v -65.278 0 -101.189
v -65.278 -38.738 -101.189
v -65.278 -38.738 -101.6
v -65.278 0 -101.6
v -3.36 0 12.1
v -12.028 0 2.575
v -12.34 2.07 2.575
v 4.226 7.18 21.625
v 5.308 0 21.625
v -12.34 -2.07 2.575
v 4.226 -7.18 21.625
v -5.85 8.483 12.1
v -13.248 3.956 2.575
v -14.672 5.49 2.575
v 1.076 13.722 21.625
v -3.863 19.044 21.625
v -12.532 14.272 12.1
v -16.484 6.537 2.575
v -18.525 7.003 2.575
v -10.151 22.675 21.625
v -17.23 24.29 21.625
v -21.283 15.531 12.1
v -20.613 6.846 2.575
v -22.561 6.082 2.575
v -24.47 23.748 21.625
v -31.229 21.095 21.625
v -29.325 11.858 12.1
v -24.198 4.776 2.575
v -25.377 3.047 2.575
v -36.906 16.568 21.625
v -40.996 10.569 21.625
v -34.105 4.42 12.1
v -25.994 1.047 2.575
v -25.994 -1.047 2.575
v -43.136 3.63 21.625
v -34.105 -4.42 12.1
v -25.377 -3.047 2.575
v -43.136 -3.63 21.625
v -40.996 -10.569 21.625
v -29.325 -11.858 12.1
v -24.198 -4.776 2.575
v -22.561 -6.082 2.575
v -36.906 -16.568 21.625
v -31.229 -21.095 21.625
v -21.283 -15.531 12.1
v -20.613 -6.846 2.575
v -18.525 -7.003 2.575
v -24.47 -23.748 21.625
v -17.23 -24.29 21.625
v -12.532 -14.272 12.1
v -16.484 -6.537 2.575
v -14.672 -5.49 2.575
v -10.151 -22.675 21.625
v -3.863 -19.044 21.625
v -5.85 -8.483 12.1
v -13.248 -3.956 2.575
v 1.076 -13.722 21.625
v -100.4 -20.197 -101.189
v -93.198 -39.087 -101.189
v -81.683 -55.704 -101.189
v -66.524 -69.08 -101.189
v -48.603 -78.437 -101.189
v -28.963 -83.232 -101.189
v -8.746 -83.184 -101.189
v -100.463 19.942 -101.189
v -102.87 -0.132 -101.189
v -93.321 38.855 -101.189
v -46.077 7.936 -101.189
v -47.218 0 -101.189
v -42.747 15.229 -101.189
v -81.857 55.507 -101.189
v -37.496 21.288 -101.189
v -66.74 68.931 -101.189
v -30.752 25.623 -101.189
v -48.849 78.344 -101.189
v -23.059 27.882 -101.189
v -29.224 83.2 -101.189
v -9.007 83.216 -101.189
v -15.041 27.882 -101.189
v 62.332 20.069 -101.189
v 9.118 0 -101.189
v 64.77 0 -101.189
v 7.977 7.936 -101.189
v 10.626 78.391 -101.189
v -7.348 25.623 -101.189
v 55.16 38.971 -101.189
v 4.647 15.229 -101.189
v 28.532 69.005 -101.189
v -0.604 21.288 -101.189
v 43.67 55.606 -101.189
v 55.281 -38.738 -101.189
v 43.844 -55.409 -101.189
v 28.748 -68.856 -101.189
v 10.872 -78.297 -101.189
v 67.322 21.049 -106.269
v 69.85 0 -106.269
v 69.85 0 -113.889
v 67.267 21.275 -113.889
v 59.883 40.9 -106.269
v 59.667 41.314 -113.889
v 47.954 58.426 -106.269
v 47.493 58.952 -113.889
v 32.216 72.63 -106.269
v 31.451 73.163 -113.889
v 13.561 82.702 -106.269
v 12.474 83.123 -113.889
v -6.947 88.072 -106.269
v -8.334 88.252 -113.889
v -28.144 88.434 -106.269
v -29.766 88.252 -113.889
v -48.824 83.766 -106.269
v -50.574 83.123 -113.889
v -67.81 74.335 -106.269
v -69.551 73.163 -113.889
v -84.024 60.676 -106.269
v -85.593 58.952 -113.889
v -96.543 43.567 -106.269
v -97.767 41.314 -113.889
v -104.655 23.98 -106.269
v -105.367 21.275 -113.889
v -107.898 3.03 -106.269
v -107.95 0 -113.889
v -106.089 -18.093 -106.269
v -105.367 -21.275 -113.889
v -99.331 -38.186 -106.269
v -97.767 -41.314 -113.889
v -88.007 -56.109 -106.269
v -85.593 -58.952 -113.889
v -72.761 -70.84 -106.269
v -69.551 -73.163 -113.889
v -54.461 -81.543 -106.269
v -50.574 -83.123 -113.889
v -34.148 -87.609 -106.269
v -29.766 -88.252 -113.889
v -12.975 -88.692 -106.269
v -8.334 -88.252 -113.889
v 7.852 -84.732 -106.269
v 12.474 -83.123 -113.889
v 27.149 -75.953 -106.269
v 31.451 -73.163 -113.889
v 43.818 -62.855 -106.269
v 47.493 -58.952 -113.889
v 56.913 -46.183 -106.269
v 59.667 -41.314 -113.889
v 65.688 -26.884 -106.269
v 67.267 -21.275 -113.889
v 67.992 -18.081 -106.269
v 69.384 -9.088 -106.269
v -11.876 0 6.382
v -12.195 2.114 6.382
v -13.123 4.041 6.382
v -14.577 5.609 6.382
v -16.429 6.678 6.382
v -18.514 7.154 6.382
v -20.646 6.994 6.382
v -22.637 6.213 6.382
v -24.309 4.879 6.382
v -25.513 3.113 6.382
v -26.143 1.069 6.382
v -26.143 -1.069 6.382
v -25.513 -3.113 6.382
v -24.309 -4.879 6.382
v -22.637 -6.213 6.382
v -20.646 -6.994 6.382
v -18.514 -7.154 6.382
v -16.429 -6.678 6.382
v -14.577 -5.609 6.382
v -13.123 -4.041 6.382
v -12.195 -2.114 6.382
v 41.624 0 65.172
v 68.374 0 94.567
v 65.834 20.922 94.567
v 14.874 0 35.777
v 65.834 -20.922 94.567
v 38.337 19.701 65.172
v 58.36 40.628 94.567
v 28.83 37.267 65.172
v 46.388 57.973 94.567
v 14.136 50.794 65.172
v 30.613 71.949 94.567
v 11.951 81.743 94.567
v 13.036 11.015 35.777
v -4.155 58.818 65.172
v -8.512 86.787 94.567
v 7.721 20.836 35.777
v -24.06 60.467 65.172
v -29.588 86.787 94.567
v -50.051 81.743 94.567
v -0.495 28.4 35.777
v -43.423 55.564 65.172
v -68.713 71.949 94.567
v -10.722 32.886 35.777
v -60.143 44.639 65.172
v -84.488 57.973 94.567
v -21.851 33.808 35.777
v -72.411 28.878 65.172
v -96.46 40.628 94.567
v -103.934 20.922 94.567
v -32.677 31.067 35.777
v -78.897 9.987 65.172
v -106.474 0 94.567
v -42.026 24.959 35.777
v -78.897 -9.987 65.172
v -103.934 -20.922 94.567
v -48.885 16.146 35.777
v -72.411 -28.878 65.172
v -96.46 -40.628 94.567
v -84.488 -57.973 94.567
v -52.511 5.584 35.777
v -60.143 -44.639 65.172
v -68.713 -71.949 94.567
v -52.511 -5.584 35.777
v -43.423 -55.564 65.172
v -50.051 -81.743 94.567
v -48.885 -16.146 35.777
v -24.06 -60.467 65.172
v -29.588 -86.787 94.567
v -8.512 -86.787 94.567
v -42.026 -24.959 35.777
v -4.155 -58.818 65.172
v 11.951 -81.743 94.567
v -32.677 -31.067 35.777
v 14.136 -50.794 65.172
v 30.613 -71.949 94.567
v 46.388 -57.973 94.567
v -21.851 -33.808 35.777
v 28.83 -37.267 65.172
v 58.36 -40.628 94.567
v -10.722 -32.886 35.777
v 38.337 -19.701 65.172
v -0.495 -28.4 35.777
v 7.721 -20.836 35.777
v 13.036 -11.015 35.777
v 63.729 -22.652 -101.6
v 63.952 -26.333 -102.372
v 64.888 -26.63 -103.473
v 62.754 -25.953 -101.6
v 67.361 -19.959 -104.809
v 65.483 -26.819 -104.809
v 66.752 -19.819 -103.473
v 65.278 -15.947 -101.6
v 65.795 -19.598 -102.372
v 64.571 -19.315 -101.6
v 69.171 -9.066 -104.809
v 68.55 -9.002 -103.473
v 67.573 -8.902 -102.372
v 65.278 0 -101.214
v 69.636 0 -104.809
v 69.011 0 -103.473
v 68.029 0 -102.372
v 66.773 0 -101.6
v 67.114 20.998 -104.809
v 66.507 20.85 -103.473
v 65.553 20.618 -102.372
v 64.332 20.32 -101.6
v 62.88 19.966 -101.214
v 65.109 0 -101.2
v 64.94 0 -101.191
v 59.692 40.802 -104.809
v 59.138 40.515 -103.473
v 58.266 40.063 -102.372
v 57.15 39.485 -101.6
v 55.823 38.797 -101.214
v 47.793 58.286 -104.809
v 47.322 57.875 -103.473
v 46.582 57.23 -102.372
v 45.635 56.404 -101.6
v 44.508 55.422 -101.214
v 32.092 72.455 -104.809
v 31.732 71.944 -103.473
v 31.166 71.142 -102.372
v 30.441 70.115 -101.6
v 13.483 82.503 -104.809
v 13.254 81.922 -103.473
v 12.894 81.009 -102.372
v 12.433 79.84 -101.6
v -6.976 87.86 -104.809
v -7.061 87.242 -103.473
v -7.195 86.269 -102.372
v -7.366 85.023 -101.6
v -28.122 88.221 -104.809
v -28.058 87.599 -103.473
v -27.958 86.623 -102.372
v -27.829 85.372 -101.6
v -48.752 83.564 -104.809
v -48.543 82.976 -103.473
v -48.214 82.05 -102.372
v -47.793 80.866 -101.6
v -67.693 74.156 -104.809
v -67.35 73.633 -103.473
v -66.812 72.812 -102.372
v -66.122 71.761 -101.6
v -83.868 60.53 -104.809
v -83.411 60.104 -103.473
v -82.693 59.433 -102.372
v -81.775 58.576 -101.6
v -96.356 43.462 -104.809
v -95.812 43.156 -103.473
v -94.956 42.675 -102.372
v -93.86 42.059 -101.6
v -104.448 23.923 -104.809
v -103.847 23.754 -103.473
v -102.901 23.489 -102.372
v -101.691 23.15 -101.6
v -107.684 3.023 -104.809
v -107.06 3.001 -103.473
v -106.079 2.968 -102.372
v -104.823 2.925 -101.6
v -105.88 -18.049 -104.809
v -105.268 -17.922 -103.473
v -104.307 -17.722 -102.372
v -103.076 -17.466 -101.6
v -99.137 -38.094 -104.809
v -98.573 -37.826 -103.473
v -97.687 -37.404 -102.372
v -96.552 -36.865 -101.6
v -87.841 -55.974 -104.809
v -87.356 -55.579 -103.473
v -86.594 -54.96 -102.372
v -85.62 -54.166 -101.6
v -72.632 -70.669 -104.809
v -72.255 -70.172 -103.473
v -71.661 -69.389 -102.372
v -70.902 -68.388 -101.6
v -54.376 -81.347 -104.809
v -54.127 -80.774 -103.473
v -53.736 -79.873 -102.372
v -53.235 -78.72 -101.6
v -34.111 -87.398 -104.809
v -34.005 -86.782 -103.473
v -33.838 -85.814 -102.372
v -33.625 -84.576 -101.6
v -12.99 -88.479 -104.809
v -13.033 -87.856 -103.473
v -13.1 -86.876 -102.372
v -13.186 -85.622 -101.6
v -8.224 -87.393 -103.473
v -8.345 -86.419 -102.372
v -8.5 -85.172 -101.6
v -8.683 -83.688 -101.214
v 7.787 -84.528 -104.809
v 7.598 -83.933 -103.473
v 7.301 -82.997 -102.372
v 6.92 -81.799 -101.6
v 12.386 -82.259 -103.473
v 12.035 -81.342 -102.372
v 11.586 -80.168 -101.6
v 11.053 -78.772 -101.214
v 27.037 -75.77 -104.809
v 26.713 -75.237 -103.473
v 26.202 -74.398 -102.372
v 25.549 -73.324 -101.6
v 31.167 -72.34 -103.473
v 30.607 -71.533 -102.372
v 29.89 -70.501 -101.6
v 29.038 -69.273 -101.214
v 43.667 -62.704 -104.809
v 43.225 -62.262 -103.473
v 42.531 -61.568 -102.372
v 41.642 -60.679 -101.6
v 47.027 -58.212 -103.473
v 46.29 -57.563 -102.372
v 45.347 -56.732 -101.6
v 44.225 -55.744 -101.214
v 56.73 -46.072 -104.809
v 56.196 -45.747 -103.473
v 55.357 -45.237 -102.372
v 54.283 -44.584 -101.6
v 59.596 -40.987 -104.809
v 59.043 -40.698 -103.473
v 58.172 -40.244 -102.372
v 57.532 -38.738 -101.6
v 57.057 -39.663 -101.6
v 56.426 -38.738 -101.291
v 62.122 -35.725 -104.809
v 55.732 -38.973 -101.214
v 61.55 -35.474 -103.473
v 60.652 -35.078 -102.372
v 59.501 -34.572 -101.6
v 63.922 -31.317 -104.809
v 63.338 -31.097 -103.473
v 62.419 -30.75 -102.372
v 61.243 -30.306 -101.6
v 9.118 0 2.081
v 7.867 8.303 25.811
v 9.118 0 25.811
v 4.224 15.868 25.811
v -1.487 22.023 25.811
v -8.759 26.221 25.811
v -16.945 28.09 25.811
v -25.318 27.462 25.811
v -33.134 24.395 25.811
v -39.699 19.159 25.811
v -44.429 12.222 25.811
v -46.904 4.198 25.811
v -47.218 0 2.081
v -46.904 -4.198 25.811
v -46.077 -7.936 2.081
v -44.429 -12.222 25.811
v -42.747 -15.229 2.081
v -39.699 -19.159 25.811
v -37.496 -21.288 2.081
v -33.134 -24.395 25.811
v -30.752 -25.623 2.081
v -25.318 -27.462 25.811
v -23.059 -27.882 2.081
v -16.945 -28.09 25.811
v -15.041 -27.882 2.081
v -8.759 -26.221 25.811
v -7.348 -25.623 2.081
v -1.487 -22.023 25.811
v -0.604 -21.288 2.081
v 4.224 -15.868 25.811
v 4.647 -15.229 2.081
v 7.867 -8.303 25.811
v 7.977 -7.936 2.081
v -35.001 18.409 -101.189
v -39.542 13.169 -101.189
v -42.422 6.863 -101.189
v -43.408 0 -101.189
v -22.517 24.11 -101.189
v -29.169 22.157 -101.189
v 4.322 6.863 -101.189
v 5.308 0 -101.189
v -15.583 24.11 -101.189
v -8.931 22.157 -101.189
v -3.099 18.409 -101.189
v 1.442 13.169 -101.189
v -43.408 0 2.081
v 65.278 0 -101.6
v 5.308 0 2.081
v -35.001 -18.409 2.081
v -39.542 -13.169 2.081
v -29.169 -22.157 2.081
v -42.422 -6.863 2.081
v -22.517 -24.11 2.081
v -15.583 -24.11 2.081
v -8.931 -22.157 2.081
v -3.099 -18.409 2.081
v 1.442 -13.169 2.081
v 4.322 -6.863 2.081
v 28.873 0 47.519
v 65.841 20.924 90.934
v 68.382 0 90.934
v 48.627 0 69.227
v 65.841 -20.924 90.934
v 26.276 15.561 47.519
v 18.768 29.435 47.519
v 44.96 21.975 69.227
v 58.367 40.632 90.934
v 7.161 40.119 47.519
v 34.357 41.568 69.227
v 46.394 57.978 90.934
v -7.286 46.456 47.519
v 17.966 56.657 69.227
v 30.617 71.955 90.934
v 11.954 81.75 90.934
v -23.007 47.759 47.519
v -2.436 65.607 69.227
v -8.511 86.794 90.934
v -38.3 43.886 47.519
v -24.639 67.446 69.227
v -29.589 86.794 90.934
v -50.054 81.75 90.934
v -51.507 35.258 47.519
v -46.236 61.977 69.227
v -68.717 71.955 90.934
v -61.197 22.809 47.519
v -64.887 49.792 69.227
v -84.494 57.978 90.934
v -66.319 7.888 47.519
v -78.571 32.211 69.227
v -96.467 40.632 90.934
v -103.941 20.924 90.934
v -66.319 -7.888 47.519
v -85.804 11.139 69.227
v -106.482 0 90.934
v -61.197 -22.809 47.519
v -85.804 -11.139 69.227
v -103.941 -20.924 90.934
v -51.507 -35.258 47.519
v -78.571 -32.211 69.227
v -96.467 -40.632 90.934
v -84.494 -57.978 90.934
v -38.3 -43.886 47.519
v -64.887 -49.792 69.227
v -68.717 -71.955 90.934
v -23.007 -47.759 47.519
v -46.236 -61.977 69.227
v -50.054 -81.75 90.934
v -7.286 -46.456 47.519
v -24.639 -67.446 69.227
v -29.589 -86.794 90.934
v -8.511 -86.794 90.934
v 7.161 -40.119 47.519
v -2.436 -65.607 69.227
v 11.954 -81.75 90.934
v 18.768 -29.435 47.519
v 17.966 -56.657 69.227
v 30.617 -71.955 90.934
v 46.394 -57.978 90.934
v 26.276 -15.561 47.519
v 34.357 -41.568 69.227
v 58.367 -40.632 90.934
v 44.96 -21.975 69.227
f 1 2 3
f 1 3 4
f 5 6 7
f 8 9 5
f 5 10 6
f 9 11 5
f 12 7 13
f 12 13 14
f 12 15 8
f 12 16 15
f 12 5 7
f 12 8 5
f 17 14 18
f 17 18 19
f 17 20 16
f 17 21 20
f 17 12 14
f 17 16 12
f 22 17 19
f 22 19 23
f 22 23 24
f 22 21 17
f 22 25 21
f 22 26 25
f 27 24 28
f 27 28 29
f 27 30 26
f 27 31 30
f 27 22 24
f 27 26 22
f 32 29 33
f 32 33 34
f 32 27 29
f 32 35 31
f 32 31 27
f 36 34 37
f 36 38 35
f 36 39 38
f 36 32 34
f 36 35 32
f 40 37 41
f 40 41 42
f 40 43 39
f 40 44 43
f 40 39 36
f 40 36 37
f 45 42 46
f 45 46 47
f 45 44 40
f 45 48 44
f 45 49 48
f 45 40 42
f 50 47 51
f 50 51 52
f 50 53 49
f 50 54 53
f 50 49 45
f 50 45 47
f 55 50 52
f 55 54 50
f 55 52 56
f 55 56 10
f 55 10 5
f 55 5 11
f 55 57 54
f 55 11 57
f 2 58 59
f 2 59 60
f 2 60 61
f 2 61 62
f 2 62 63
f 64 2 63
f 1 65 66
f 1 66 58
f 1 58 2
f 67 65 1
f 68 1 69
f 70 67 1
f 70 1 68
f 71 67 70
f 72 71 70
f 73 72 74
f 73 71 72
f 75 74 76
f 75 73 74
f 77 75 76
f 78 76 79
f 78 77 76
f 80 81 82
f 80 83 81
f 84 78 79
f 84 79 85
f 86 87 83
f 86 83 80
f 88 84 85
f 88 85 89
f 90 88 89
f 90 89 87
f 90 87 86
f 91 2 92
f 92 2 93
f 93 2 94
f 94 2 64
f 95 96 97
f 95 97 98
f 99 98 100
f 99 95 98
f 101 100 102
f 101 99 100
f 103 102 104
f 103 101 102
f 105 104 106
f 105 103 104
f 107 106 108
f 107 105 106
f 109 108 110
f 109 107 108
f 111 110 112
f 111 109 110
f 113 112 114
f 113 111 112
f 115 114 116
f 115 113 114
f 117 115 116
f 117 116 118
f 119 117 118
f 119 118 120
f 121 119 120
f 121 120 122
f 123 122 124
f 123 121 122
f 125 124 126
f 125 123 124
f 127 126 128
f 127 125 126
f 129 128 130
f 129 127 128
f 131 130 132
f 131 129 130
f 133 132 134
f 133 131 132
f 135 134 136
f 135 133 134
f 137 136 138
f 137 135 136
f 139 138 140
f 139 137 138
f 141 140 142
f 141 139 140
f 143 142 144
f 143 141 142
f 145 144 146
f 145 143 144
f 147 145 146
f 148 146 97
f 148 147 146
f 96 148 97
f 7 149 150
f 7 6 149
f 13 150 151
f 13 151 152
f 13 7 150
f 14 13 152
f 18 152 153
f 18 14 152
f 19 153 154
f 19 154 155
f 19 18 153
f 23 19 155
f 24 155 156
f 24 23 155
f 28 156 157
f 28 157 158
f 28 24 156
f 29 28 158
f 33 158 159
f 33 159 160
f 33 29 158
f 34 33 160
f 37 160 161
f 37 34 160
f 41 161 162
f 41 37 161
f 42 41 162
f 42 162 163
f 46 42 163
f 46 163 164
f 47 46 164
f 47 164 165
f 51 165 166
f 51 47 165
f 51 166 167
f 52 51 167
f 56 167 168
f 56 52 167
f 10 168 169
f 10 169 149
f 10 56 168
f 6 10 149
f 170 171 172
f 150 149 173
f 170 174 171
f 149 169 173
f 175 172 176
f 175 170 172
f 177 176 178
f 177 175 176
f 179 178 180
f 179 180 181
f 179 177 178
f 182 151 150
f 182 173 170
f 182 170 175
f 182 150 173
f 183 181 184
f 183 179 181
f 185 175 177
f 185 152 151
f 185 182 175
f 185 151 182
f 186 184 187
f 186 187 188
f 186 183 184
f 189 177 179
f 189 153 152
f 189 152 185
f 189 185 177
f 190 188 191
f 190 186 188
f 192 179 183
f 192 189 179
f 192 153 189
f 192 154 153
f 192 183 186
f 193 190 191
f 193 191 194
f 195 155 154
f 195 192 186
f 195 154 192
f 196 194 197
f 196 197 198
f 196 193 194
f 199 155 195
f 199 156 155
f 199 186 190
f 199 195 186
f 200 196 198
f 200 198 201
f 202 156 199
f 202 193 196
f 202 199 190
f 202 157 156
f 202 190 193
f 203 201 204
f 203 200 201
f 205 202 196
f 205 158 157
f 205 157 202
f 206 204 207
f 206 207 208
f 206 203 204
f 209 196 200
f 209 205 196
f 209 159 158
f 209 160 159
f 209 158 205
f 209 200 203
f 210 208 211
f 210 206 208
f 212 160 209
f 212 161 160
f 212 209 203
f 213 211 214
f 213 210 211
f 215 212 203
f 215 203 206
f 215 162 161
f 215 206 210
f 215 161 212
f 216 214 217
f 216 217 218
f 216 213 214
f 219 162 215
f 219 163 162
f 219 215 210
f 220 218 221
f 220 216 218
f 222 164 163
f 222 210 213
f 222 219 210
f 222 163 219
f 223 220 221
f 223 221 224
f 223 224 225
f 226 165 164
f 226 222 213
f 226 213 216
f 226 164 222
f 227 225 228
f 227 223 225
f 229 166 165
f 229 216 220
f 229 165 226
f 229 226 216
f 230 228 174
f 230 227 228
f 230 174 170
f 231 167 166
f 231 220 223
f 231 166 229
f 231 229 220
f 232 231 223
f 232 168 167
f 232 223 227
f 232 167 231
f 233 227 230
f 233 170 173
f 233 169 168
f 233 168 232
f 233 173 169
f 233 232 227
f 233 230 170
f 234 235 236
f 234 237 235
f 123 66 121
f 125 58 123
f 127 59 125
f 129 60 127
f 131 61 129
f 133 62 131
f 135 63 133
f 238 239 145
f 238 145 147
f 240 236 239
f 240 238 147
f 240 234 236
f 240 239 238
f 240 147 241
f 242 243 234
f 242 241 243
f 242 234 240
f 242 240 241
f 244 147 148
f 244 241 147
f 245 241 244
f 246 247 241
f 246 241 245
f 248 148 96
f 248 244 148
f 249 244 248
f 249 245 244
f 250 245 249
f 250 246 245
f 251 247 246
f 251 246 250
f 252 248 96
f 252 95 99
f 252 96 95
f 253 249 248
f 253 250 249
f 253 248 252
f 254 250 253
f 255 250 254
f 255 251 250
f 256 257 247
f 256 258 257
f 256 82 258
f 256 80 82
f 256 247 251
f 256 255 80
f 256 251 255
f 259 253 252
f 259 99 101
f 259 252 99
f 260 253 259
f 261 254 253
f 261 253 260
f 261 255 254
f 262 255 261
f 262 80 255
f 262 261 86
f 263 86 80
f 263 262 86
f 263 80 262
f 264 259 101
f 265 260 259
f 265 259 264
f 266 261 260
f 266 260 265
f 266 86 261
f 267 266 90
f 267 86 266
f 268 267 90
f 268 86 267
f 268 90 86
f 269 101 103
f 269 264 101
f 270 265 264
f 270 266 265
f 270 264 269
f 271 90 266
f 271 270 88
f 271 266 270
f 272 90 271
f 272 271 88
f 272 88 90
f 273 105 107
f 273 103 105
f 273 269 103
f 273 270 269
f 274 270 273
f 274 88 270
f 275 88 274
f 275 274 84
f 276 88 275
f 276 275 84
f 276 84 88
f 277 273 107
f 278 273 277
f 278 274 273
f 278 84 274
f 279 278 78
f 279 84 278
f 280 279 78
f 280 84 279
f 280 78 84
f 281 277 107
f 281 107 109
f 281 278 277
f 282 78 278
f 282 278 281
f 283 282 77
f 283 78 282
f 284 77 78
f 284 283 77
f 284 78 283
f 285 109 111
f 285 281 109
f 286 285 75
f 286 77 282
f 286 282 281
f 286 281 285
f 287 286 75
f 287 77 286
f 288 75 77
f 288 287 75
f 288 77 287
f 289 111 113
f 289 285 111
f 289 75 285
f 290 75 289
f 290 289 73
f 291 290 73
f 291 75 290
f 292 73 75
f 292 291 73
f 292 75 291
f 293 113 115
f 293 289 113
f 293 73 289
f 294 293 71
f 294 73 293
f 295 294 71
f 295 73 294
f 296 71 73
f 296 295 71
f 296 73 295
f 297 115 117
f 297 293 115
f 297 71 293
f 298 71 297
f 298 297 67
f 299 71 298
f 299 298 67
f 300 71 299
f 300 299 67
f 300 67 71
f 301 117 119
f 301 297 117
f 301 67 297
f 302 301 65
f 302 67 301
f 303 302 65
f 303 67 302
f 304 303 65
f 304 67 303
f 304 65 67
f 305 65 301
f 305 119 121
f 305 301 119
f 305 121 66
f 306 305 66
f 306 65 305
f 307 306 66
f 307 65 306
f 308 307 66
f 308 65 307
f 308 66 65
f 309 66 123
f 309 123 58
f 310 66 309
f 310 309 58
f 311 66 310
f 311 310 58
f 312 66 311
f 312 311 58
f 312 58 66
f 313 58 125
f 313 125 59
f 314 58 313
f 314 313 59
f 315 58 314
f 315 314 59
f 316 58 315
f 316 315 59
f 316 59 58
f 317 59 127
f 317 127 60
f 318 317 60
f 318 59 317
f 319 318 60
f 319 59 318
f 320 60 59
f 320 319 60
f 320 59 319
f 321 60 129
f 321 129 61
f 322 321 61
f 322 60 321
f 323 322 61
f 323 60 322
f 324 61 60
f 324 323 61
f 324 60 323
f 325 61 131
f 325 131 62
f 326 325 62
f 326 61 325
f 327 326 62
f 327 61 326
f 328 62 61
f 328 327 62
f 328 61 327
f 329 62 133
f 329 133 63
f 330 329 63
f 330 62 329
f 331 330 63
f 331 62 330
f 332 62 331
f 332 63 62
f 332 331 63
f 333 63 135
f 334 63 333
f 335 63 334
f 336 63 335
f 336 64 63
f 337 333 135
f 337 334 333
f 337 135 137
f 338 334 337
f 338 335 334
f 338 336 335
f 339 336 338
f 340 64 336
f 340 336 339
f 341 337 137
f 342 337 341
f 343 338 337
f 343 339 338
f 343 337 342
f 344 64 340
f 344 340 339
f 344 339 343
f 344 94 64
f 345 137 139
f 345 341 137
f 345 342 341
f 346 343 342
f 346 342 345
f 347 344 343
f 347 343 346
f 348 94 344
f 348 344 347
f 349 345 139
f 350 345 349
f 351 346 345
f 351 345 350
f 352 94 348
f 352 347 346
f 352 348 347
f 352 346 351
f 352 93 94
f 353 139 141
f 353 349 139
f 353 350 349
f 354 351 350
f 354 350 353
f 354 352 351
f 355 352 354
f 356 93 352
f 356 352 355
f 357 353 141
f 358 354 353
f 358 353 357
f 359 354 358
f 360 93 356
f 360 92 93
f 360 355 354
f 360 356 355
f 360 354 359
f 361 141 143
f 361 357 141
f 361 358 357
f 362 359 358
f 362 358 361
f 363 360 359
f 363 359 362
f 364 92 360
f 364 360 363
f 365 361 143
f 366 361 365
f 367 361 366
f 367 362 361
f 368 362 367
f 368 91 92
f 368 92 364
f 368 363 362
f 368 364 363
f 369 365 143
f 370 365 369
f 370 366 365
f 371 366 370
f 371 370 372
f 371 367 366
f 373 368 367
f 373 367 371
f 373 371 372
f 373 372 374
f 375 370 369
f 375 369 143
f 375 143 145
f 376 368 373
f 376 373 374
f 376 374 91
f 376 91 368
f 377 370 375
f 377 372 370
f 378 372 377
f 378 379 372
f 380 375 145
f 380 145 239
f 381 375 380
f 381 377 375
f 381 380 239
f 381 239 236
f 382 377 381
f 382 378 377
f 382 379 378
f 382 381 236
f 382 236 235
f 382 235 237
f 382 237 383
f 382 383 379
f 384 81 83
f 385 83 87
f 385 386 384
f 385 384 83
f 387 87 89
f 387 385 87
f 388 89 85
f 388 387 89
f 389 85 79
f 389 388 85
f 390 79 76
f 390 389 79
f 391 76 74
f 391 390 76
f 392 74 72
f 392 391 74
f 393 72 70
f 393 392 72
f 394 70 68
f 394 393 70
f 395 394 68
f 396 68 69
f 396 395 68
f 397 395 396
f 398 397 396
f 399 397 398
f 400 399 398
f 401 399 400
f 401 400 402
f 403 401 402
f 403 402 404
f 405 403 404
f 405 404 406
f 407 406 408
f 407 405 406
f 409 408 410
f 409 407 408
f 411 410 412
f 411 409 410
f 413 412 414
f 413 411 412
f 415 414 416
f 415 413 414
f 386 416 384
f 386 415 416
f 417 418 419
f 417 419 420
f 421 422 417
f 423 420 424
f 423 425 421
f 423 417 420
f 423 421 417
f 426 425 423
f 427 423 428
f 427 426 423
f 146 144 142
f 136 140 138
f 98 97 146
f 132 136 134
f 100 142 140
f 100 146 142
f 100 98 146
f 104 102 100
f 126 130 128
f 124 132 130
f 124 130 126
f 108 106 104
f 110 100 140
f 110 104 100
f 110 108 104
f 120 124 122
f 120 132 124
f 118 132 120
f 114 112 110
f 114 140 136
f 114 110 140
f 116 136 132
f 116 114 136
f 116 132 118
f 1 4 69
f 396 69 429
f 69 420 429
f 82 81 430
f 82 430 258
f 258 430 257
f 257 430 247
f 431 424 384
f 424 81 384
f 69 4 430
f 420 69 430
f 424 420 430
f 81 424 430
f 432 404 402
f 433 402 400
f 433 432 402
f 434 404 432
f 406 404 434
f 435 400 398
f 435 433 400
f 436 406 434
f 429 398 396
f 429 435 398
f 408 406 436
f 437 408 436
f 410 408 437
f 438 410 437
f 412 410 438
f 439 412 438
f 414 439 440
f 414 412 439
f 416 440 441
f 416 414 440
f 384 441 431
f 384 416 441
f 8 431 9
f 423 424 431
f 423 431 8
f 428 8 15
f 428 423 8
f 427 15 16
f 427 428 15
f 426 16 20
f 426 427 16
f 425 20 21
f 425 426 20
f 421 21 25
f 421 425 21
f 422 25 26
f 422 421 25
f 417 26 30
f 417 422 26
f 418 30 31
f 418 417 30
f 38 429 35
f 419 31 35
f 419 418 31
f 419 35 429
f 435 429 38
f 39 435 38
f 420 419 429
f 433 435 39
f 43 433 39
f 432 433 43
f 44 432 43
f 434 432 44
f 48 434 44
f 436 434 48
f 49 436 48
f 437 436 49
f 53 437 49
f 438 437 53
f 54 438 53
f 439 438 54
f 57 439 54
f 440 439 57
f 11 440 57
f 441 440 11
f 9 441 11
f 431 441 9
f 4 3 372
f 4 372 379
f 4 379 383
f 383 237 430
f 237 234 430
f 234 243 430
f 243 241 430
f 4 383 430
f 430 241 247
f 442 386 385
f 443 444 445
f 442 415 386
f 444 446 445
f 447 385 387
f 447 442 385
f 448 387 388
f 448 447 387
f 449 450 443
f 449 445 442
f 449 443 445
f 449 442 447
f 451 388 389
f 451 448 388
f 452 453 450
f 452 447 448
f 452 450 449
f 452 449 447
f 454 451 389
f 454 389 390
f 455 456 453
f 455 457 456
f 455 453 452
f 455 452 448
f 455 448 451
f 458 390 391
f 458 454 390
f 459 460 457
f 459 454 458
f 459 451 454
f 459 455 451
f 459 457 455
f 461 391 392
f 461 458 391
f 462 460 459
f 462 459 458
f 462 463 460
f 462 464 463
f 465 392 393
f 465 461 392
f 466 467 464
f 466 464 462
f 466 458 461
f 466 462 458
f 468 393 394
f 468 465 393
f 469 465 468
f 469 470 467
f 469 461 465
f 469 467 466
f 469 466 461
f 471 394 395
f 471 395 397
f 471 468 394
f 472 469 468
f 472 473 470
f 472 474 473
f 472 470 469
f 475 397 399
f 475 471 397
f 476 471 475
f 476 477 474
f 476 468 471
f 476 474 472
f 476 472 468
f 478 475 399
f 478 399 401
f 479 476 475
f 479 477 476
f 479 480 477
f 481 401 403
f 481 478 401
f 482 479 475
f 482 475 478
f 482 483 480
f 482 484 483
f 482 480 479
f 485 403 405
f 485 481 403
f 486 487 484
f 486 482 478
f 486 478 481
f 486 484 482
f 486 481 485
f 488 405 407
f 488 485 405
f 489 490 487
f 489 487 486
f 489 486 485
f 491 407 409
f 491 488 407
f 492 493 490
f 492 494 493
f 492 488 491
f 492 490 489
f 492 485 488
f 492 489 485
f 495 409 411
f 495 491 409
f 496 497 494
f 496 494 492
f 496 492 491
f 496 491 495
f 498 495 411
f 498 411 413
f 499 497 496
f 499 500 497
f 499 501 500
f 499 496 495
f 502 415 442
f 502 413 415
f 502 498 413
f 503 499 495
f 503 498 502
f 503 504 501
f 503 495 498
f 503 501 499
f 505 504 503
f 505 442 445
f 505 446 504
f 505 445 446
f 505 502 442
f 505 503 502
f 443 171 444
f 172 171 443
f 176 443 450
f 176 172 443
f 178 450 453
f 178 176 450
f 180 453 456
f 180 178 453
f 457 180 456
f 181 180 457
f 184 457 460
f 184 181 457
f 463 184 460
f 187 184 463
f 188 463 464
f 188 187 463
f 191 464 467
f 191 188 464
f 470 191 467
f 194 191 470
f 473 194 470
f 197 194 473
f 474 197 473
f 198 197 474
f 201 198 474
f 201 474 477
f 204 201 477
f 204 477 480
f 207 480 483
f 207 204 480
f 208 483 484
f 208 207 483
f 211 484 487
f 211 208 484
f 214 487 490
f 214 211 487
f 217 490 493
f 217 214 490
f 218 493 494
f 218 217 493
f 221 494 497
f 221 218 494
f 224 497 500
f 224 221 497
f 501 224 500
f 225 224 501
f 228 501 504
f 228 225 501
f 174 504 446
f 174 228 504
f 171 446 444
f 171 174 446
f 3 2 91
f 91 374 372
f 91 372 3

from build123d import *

# Parameters (mm, degrees)
F2_W        = 38.7379527092
F2_H        = 101.6
F2_H_2      = 2.0811606664
F3_DEPTH    = 65.278
F4_T2_ANGLE = 342.3977360444
F4_T4_ANGLE = 26.640456748


# Not quite as in the source:
# - a fillet or chamfer that OpenCascade refuses, or shapes differently, is made with other operations: its cross-section is extruded or revolved along the edge and cut away or added
# - a feature names something its author has since deleted; it is built from what else it names


with BuildPart() as f1:
    # F0 (on Front) → F1 (revolve)
    with BuildSketch(Plane.XZ):
        Polygon((-19.05, -101.1886583478), (-19.05, -113.8886583478), (69.85, -113.8886583478), (69.85, -101.1886583478), (9.1183487131, -101.1886583478), (5.3083487131, -101.1886583478), align=None)
        Polygon((5.3083487131, 21.6246411156), (5.3083487131, -101.1886583478), (9.1183487131, -101.1886583478), (9.1183487131, 25.8113416522), align=None)
        Polygon((0, 15.7914478332), (5.3083487131, 21.6246411156), (9.1183487131, 25.8113416522), (68.3819557915, 90.9344323502), (68.3744283423, 94.5670089535), (-0.0075274492, 19.4240244364), (-11.8764168927, 6.3816397113), (-12.0276177274, 2.5746411156), align=None)
    revolve(axis=Axis((-19.05, 0, -107.5386583478), (0, 0, 1)))

    # F2 (on Right) → F3 (cut, symmetric)
    with BuildSketch(Plane.YZ):
        with Locations((-19.3689763546, -50.8)):
            Rectangle(F2_W, F2_H)
        with Locations((-19.3689763546, 1.0405803332)):
            Rectangle(F2_W, F2_H_2)
    extrude(amount=F3_DEPTH, both=True, mode=Mode.SUBTRACT)

    # F4: fillet of radius 5.08 on 1 edges, made by hand

    # F4_s1 → F4_t2 (revolve, cut)
    with BuildSketch(Plane.XZ):
        with BuildLine():
            ThreePointArc((69.85, -106.2686583478), (68.3621024484, -102.6765558993), (64.77, -101.1886583478))
            Line((64.77, -101.1886583478), (69.85, -101.1886583478))
            Line((69.85, -101.1886583478), (69.85, -106.2686583478))
        make_face()
    revolve(axis=Axis((-19.05, 0, -101.1886583478), (0, 0, 1)), revolution_arc=F4_T2_ANGLE, mode=Mode.SUBTRACT)

    # F4_s3 → F4_t4 (revolve, cut)
    with BuildSketch(Plane(origin=(-3.8300767646, -7.635016329, 0), x_dir=(0, 0, 1), z_dir=(-0.4483903416, -0.8938378497, 0))):
        with BuildLine():
            ThreePointArc((-106.2686583478, -71.8723889628), (-102.6765558993, -70.3844914112), (-101.1886583478, -66.7923889628))
            Line((-101.1886583478, -66.7923889628), (-101.1886583478, -71.8723889628))
            Line((-101.1886583478, -71.8723889628), (-106.2686583478, -71.8723889628))
        make_face()
    revolve(axis=Axis((-19.05, 0, -101.1886583478), (0, 0, 1)), revolution_arc=F4_T4_ANGLE, mode=Mode.SUBTRACT)


solid = f1.part
